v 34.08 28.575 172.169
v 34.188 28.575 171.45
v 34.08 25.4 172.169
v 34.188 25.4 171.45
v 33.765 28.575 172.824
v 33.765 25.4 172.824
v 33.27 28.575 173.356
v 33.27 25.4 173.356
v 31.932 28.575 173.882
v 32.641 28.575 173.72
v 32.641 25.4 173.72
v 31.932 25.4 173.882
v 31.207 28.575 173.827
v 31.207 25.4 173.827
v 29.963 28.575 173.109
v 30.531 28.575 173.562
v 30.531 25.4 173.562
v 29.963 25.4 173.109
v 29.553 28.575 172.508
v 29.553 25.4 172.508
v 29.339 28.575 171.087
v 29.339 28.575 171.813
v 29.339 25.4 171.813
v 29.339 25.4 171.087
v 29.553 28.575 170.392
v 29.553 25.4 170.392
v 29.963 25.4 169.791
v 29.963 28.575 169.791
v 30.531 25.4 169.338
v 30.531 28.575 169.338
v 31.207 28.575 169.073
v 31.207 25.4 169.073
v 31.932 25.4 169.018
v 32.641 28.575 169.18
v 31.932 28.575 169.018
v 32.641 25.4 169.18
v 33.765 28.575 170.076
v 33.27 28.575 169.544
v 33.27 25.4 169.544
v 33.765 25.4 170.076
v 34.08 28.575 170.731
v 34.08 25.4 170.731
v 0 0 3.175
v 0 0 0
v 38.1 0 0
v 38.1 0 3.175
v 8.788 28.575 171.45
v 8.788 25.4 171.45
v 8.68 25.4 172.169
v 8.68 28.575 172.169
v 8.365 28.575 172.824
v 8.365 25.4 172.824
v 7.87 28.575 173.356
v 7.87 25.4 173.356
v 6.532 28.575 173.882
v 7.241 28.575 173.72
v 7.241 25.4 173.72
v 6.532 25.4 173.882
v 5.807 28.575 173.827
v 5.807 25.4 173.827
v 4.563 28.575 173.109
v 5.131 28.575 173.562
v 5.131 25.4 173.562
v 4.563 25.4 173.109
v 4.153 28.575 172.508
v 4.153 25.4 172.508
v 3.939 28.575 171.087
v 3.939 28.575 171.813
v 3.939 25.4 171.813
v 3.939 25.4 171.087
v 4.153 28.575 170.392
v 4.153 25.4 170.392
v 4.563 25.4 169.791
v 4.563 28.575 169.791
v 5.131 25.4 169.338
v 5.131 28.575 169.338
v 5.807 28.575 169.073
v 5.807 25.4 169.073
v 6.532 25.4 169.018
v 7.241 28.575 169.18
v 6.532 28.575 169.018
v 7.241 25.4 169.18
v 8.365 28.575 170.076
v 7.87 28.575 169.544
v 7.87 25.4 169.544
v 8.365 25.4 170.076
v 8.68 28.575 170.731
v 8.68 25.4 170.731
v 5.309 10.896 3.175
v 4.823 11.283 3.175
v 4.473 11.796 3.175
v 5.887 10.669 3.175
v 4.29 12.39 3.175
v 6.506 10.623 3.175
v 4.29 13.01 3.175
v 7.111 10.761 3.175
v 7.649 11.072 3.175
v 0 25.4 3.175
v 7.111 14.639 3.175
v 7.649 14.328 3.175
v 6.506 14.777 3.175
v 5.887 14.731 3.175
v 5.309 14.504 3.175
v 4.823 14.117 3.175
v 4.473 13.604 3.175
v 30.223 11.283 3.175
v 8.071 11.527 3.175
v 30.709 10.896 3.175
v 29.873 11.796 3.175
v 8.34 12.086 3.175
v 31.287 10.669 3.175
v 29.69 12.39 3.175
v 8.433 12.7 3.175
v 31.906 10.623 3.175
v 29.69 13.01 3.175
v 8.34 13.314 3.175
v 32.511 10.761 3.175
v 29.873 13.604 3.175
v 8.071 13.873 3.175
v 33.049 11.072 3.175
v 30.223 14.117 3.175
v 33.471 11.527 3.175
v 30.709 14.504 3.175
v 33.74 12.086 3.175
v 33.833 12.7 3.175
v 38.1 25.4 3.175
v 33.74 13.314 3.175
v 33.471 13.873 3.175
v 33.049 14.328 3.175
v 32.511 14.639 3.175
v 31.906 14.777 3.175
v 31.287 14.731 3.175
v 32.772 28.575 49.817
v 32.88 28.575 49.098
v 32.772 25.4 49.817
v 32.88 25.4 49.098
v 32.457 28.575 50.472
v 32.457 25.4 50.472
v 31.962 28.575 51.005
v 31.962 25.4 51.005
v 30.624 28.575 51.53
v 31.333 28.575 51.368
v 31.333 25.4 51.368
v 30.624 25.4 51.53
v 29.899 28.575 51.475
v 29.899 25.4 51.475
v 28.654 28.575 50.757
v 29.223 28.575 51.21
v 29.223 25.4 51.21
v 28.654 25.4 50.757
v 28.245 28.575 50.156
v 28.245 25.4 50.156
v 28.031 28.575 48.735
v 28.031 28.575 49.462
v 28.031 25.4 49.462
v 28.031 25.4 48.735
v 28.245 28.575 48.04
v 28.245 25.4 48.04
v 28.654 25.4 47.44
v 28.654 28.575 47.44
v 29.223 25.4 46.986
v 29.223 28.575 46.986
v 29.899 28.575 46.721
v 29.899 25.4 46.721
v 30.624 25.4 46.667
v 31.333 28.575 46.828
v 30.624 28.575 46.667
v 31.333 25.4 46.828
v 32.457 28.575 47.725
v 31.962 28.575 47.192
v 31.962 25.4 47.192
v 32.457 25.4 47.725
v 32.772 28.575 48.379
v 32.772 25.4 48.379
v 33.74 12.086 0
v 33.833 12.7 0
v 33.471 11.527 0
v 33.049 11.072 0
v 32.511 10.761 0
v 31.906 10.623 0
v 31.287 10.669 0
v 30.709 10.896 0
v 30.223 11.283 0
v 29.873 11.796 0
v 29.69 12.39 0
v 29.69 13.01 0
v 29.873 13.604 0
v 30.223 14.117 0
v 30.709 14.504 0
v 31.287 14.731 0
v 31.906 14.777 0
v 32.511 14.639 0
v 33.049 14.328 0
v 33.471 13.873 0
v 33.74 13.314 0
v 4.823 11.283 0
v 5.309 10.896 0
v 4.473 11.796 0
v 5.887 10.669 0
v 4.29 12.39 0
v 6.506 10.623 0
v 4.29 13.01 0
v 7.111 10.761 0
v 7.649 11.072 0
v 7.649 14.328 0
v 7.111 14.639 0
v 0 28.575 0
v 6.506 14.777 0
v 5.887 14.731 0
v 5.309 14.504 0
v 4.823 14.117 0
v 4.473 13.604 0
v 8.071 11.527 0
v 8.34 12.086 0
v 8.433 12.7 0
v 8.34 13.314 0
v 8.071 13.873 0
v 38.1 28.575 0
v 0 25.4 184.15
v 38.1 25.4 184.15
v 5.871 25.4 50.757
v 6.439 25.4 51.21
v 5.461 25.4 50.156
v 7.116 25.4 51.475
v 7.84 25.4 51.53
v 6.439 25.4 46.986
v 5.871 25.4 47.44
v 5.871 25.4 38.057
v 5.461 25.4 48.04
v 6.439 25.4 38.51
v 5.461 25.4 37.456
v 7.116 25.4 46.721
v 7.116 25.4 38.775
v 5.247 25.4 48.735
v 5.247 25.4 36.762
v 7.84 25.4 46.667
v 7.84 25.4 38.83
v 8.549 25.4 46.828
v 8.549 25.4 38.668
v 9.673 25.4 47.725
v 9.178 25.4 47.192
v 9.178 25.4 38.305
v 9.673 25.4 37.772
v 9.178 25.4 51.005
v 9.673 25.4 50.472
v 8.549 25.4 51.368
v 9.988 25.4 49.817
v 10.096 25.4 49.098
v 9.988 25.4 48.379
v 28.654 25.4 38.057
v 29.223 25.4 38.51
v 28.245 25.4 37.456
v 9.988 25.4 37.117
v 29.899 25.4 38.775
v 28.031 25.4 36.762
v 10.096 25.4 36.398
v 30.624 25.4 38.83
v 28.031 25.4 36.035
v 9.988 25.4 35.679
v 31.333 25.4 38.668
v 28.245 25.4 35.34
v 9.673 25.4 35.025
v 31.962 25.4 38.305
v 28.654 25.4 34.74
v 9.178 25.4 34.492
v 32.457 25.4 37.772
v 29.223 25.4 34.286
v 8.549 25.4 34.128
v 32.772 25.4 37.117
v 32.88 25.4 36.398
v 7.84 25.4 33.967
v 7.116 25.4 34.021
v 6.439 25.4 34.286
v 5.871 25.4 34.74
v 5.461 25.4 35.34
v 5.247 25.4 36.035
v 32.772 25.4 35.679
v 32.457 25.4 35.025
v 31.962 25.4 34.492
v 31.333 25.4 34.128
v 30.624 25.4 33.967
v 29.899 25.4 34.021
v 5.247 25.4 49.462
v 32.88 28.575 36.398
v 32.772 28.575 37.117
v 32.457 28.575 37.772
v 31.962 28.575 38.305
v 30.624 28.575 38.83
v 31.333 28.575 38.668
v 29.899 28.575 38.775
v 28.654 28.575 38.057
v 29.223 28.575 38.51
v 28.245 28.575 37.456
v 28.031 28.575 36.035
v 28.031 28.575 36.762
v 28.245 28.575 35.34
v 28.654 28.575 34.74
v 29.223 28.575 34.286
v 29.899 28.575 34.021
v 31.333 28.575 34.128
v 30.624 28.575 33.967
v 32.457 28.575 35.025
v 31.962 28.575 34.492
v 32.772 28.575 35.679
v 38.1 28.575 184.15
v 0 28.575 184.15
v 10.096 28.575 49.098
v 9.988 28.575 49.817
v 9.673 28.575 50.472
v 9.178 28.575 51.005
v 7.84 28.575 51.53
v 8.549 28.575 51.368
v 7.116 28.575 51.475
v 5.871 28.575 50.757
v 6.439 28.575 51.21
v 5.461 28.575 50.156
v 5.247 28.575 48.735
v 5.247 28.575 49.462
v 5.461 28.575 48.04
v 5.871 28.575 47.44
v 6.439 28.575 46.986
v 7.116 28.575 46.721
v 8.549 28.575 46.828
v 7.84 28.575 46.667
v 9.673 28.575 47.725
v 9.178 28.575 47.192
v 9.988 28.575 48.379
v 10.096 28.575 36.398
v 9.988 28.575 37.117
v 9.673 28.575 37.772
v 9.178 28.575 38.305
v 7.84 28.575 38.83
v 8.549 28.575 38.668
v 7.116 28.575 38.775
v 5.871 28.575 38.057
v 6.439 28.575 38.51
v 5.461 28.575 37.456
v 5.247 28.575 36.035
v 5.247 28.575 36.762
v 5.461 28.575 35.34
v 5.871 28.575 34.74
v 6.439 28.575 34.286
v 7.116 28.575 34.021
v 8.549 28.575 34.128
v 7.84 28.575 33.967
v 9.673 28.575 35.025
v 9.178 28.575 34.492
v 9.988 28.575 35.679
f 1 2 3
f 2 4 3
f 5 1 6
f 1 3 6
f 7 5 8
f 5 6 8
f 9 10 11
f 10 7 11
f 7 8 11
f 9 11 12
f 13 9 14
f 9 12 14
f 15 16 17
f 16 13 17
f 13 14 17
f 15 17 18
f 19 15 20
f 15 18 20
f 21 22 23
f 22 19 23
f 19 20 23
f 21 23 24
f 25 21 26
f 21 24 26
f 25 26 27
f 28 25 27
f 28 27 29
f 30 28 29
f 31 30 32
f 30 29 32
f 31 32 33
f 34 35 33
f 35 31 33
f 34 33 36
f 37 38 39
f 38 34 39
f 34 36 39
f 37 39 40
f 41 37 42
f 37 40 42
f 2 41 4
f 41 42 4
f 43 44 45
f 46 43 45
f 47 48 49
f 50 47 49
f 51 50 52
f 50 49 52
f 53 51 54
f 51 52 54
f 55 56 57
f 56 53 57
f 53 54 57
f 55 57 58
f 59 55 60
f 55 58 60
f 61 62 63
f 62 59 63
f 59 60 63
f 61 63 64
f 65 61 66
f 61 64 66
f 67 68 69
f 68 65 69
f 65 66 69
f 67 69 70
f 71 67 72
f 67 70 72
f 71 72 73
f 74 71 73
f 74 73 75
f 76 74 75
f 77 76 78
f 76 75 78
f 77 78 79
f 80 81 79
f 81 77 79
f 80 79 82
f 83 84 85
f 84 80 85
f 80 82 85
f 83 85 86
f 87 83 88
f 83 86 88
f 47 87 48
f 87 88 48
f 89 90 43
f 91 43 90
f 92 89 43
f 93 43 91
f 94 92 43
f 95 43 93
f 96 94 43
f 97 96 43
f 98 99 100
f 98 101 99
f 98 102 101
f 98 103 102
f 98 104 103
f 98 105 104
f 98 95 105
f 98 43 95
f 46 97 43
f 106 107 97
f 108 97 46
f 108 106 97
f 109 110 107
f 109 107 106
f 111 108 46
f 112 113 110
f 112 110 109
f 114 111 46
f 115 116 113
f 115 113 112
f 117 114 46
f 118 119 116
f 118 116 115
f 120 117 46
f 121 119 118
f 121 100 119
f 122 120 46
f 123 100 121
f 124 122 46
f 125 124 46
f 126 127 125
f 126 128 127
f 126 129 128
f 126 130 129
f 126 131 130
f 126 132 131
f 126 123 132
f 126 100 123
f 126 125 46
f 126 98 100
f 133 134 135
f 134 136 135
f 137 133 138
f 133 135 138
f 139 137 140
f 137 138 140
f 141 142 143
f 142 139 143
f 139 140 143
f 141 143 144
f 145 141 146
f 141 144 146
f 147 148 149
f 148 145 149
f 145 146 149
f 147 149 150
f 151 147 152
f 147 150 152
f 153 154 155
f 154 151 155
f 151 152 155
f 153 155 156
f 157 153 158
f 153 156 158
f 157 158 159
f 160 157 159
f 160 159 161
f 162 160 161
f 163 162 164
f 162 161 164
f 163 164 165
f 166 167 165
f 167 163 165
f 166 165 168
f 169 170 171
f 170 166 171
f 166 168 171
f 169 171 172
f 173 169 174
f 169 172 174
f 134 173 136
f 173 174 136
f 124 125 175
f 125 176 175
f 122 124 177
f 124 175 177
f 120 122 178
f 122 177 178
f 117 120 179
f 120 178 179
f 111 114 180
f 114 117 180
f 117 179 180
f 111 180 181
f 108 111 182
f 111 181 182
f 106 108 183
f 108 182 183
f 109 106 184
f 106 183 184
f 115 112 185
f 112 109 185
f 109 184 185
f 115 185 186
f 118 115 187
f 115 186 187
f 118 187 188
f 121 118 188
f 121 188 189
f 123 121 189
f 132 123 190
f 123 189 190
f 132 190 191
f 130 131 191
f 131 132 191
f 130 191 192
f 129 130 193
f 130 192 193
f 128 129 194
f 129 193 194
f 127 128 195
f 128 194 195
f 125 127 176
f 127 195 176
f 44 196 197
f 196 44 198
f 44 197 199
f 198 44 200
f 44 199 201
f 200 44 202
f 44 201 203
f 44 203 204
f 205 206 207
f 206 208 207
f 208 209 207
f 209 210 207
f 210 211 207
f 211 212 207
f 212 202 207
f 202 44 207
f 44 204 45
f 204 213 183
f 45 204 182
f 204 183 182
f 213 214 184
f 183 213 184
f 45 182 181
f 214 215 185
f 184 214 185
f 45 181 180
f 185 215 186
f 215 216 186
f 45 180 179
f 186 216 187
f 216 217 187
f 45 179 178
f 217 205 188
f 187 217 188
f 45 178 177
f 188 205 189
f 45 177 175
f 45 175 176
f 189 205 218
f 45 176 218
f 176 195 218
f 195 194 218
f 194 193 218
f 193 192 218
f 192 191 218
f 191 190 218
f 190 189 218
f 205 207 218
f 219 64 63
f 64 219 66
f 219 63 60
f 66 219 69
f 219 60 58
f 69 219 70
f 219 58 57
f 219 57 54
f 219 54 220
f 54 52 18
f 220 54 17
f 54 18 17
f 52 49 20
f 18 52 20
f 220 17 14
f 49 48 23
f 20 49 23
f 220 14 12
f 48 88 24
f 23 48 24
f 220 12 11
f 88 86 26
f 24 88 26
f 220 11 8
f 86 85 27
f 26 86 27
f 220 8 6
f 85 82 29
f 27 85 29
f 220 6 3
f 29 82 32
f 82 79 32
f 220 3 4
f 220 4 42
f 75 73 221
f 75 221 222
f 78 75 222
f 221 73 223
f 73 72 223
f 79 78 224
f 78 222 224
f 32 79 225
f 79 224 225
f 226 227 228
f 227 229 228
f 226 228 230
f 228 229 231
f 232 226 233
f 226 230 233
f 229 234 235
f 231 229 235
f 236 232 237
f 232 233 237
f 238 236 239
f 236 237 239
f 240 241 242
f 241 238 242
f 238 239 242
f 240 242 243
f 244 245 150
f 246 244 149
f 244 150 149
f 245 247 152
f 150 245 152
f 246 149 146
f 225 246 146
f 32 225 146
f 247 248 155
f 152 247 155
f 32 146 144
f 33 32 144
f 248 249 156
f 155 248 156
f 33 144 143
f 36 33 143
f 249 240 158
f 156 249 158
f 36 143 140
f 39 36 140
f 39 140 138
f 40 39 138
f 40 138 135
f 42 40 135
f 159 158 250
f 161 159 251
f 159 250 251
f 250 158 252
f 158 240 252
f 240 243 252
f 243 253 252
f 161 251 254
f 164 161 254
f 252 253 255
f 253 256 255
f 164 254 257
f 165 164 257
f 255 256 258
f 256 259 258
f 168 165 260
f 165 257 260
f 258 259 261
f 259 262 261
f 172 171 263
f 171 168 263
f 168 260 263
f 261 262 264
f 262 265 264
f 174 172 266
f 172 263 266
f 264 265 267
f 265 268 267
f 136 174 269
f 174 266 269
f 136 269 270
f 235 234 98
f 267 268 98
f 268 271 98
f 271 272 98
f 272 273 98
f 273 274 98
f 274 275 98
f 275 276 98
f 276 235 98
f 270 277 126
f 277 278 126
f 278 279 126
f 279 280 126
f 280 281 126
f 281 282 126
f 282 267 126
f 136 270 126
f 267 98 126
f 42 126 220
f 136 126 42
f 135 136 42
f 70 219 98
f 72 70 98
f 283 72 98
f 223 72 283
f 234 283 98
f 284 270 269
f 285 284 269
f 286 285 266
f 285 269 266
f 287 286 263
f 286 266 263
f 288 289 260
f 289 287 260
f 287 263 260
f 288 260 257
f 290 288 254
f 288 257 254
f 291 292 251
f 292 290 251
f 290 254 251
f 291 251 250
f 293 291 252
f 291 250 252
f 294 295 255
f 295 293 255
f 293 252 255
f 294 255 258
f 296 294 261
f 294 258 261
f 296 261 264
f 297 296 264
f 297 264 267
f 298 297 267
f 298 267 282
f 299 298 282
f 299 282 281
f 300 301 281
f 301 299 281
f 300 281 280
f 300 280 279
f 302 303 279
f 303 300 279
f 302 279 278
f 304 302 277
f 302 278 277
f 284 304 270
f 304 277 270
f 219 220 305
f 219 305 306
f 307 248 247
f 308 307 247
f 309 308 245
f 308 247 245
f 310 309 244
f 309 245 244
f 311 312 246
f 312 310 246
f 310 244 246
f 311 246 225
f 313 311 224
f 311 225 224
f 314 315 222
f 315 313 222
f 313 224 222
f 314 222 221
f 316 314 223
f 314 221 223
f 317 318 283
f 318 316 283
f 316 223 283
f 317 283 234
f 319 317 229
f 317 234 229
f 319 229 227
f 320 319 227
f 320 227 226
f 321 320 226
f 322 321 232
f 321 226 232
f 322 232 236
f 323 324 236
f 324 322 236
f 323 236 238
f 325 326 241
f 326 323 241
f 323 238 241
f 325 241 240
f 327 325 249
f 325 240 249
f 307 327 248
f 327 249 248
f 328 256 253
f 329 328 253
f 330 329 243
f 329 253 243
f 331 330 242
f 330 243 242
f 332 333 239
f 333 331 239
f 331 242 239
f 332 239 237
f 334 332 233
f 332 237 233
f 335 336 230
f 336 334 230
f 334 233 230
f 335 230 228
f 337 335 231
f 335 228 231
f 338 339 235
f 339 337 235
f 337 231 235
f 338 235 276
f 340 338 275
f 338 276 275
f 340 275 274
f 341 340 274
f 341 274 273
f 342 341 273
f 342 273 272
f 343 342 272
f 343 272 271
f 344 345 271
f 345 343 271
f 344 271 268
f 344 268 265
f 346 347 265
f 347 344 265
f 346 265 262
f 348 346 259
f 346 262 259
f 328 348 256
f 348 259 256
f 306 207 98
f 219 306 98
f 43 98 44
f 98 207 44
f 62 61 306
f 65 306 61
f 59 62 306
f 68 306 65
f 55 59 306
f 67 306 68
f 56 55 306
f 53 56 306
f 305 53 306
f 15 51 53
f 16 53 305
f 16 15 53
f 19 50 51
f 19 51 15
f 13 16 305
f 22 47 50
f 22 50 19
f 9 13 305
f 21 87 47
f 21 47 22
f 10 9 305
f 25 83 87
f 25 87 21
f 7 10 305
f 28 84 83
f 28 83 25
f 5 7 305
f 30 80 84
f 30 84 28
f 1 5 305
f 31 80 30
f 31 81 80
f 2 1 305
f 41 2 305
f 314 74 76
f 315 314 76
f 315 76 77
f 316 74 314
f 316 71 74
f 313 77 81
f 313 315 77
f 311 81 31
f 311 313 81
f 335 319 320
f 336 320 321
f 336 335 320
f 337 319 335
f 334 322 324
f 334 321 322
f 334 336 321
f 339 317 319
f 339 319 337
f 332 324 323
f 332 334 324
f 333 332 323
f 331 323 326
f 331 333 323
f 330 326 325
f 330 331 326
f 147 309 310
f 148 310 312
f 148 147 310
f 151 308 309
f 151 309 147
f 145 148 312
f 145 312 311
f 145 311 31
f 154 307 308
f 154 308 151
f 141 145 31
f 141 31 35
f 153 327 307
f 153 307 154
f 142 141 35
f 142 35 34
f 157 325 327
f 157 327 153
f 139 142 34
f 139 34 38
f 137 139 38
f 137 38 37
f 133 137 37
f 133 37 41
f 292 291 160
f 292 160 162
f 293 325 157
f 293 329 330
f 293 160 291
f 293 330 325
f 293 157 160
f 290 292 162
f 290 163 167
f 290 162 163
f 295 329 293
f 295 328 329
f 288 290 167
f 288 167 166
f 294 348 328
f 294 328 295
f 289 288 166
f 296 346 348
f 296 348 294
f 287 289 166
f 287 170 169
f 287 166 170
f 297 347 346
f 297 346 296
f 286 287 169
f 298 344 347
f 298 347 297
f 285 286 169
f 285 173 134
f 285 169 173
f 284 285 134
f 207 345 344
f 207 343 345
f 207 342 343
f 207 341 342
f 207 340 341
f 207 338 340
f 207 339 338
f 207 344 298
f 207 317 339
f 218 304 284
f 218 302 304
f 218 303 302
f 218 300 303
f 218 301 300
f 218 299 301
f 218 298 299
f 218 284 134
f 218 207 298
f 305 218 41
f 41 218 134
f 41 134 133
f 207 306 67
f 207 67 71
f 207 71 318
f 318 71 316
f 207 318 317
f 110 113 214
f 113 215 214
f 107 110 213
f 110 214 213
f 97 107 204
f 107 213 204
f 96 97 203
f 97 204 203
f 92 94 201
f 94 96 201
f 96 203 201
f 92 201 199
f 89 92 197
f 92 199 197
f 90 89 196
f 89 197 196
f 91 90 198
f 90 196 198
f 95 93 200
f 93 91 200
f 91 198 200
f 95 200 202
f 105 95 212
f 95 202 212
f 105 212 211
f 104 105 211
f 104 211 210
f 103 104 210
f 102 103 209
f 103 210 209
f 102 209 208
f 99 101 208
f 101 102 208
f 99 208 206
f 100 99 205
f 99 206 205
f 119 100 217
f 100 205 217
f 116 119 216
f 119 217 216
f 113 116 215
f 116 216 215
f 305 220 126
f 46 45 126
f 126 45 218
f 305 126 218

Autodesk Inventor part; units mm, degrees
ref_plane "YZ Plane" through (0, 0, 0) normal (1, 0, 0) x (0, 1, 0)
ref_plane "XZ Plane" through (0, 0, 0) normal (0, 1, 0) x (-1, 0, 0)
ref_plane "XY Plane" through (0, 0, 0) normal (0, 0, 1) x (1, 0, 0)
sketch "Sketch1" plane through (0, 0, 0) normal (0, 0, 1) x (1, 0, 0)
  line L0 (0, 0) -> (38.1, 0)
  line L1 (38.1, 0) -> (38.1, 25.4)
  line L2 (38.1, 25.4) -> (0, 25.4)
  line L3 (0, 25.4) -> (0, 0)
  circle A0 centre (6.35, 12.7) radius 2.0828
  circle A1 centre (31.75, 12.7) radius 2.0828
  dimension "d0" = 38.1
  dimension "d1" = 25.4
  dimension "d2" = 4.1656
  dimension "d3" = 12.7
  dimension "d4" = 6.35
  dimension "d26" = 25.4
extrude "Plate1" add sketch "Sketch1" along normal blind 3.175
sketch "Sketch2" plane through (0, 25.4, 0) normal (0, 1, 0) x (1, 0, 0)
  line L0 (0, -3.175) -> (38.1, -3.175) projected
  line L1 (38.1, 0) -> (38.1, -3.175) projected
  line L2 (0, 0) -> (38.1, 0)
  line L3 (38.1, 0) -> (38.1, -184.15)
  line L4 (38.1, -184.15) -> (0, -184.15)
  line L5 (0, -184.15) -> (0, 0)
  circle A0 centre (6.35, -171.45) radius 2.4384
  line L6 (19.05, -184.15) -> (19.05, -3.175) construction
  circle A1 centre (31.75, -171.45) radius 2.4384
  circle A2 centre (7.6581, -49.0982) radius 2.4384
  circle A3 centre (7.6581, -36.3982) radius 2.4384
  circle A4 centre (30.4419, -49.0982) radius 2.4384
  circle A5 centre (30.4419, -36.3982) radius 2.4384
  line L7 (7.6581, -36.3982) -> (7.6581, -49.0982) construction
  dimension "d14" = 4.8768
  dimension "d15" = 184.15
  dimension "d16" = 12.7
  dimension "d17" = 12.7
  dimension "d21" = 12.7
  dimension "d22" = 11.3919
  dimension "d23" = 122.3518
extrude "Extrusion1" add sketch "Sketch2" along normal blind 3.175
equation "\"BendRadius\" = Thickness"
equation "\"BendReliefWidth\" = Thickness"
equation "\"BendReliefDepth\" = 0.5 * Thickness"
equation "\"CornerReliefSize\" = 4 * Thickness"
equation "\"MinimumRemnant\" = 2 * Thickness"
equation "\"TransitionRadius\" = BendRadius"
equation "\"JacobiRadiusSize\" = BendRadius"
equation "\"GapSize\" = Thickness"
equation "\"d13\" = BendRadius"
equation "\"Thickness\" = 3.175"
properties part number "Flange for 3-4 in Piston" material "Aluminum"
